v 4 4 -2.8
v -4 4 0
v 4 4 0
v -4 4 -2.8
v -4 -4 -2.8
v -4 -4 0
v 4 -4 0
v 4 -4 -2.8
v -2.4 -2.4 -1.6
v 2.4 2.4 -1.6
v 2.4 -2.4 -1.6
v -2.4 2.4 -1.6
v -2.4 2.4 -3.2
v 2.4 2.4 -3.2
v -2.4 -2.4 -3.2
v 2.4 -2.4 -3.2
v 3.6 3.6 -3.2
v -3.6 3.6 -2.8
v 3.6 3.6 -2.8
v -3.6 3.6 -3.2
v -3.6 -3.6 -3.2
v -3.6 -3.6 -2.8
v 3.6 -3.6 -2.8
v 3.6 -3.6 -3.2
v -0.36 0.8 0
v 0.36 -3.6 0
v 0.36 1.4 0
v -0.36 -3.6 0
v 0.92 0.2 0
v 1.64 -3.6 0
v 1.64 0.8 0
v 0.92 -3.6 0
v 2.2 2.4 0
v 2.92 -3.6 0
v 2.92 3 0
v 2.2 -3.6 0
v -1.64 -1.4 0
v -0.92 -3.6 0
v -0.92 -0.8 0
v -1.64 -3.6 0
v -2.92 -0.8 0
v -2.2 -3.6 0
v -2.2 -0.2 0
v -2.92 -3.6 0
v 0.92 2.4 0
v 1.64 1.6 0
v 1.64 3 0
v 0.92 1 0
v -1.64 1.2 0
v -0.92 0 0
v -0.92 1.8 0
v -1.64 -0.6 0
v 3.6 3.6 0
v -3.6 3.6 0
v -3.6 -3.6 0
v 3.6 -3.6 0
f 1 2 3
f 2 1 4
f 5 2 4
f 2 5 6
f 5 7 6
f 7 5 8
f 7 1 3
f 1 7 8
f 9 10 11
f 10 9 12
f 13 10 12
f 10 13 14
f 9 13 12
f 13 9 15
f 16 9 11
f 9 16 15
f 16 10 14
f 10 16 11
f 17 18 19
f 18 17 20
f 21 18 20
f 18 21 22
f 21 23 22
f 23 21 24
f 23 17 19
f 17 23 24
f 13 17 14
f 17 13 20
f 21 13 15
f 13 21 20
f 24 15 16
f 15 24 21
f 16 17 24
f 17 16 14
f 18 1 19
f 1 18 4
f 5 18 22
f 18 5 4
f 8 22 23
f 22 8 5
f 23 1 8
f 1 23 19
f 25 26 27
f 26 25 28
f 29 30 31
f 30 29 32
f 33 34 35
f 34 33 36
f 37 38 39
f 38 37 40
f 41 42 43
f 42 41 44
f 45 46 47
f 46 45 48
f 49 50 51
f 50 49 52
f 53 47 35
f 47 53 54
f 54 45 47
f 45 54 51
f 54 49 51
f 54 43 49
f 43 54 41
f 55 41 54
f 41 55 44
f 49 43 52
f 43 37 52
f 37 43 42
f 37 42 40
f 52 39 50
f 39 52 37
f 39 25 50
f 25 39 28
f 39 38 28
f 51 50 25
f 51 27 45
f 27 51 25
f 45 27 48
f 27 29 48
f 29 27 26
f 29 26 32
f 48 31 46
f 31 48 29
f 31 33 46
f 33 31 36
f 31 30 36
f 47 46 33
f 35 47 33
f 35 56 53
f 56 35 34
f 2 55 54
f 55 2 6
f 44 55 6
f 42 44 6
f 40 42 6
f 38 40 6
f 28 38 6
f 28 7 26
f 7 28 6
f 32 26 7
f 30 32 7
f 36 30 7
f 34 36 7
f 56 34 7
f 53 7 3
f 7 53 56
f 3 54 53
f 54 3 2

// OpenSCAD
// file: ../p/box5.scad
use <../lib.scad>
function ldraw_lib__box5() = [
// 0 Box with 5 Faces and All Edges
// 0 Name: box5.dat
// 0 Author: James Jessiman
// 0 !LDRAW_ORG Primitive UPDATE 2012-01
// 0 !LICENSE Licensed under CC BY 4.0 : see CAreadme.txt
// 
// 0 BFC CERTIFY CCW
  [0,"BFC","CERTIFY"],
  [0,"BFC","CCW"],
// 
// 0 !HISTORY 2002-04-03 [sbliss] Modified for BFC compliance
// 0 !HISTORY 2002-04-25 [PTadmin] Official Update 2002-02
// 0 !HISTORY 2007-06-24 [PTadmin] Header formatted for Contributor Agreement
// 0 !HISTORY 2008-07-01 [PTadmin] Official Update 2008-01
// 0 !HISTORY 2012-02-16 [Philo] Changed to CCW
// 0 !HISTORY 2012-03-30 [PTadmin] Official Update 2012-01
// 
// 
// 2 24 1 1 1 -1 1 1
  [2,24,1,1,1,-1,1,1],
// 2 24 -1 1 1 -1 1 -1
  [2,24,-1,1,1,-1,1,-1],
// 2 24 -1 1 -1 1 1 -1
  [2,24,-1,1,-1,1,1,-1],
// 2 24 1 1 -1 1 1 1
  [2,24,1,1,-1,1,1,1],
// 2 24 1 0 1 -1 0 1
  [2,24,1,0,1,-1,0,1],
// 2 24 -1 0 1 -1 0 -1
  [2,24,-1,0,1,-1,0,-1],
// 2 24 -1 0 -1 1 0 -1
  [2,24,-1,0,-1,1,0,-1],
// 2 24 1 0 -1 1 0 1
  [2,24,1,0,-1,1,0,1],
// 2 24 1 0 1 1 1 1
  [2,24,1,0,1,1,1,1],
// 2 24 -1 0 1 -1 1 1
  [2,24,-1,0,1,-1,1,1],
// 2 24 1 0 -1 1 1 -1
  [2,24,1,0,-1,1,1,-1],
// 2 24 -1 0 -1 -1 1 -1
  [2,24,-1,0,-1,-1,1,-1],
// 4 16 -1 1 1 1 1 1 1 1 -1 -1 1 -1
  [4,16,-1,1,1,1,1,1,1,1,-1,-1,1,-1],
// 4 16 -1 1 1 -1 0 1 1 0 1 1 1 1
  [4,16,-1,1,1,-1,0,1,1,0,1,1,1,1],
// 4 16 -1 1 -1 -1 0 -1 -1 0 1 -1 1 1
  [4,16,-1,1,-1,-1,0,-1,-1,0,1,-1,1,1],
// 4 16 1 1 -1 1 0 -1 -1 0 -1 -1 1 -1
  [4,16,1,1,-1,1,0,-1,-1,0,-1,-1,1,-1],
// 4 16 1 1 1 1 0 1 1 0 -1 1 1 -1
  [4,16,1,1,1,1,0,1,1,0,-1,1,1,-1],
];
module ldraw_lib__box5(step=0, col=false, unit=2/5, alt=false, line=0.2, solid=!$preview)
    makepoly(ldraw_lib__box5(), step=step, col=col, unit=unit, alt=alt, line=line, solid=solid);
ldraw_lib__box5(line=0.2);
// file: ../p/box4.scad
use <../lib.scad>
function ldraw_lib__box4() = [
// 0 Box with 4 Faces (2 Parallel Pairs) and All Edges
// 0 Name: box4.dat
// 0 Author: James Jessiman
// 0 !LDRAW_ORG Primitive UPDATE 2012-01
// 0 !LICENSE Licensed under CC BY 4.0 : see CAreadme.txt
// 
// 0 BFC CERTIFY CCW
  [0,"BFC","CERTIFY"],
  [0,"BFC","CCW"],
// 
// 0 !HISTORY 2002-04-03 [sbliss] Modified for BFC compliance
// 0 !HISTORY 2002-04-25 [PTadmin] Official Update 2002-02
// 0 !HISTORY 2007-06-24 [PTadmin] Header formatted for Contributor Agreement
// 0 !HISTORY 2008-07-01 [PTadmin] Official Update 2008-01
// 0 !HISTORY 2012-02-16 [Philo] Changed to CCW
// 0 !HISTORY 2012-03-30 [PTadmin] Official Update 2012-01
// 
// 
// 2 24 1 1 1 -1 1 1
  [2,24,1,1,1,-1,1,1],
// 2 24 -1 1 1 -1 1 -1
  [2,24,-1,1,1,-1,1,-1],
// 2 24 -1 1 -1 1 1 -1
  [2,24,-1,1,-1,1,1,-1],
// 2 24 1 1 -1 1 1 1
  [2,24,1,1,-1,1,1,1],
// 2 24 1 0 1 -1 0 1
  [2,24,1,0,1,-1,0,1],
// 2 24 -1 0 1 -1 0 -1
  [2,24,-1,0,1,-1,0,-1],
// 2 24 -1 0 -1 1 0 -1
  [2,24,-1,0,-1,1,0,-1],
// 2 24 1 0 -1 1 0 1
  [2,24,1,0,-1,1,0,1],
// 2 24 1 0 1 1 1 1
  [2,24,1,0,1,1,1,1],
// 2 24 -1 0 1 -1 1 1
  [2,24,-1,0,1,-1,1,1],
// 2 24 1 0 -1 1 1 -1
  [2,24,1,0,-1,1,1,-1],
// 2 24 -1 0 -1 -1 1 -1
  [2,24,-1,0,-1,-1,1,-1],
// 4 16 -1 1 1 -1 0 1 1 0 1 1 1 1
  [4,16,-1,1,1,-1,0,1,1,0,1,1,1,1],
// 4 16 -1 1 -1 -1 0 -1 -1 0 1 -1 1 1
  [4,16,-1,1,-1,-1,0,-1,-1,0,1,-1,1,1],
// 4 16 1 1 -1 1 0 -1 -1 0 -1 -1 1 -1
  [4,16,1,1,-1,1,0,-1,-1,0,-1,-1,1,-1],
// 4 16 1 1 1 1 0 1 1 0 -1 1 1 -1
  [4,16,1,1,1,1,0,1,1,0,-1,1,1,-1],
];
module ldraw_lib__box4(step=0, col=false, unit=2/5, alt=false, line=0.2, solid=!$preview)
    makepoly(ldraw_lib__box4(), step=step, col=col, unit=unit, alt=alt, line=line, solid=solid);
ldraw_lib__box4(line=0.2);
// file: s/3070bs01.scad
use <../../lib.scad>
use <../../p/box4.scad>
use <../../p/box5.scad>
function ldraw_lib__s__3070bs01() = [
// 0 ~Tile  1 x  1 with Groove without Top Face
// 0 Name: s\3070bs01.dat
// 0 Author: Chris Dee [cwdee]
// 0 !LDRAW_ORG Subpart UPDATE 2009-02
// 0 !LICENSE Licensed under CC BY 4.0 : see CAreadme.txt
// 
// 0 BFC CERTIFY CCW
  [0,"BFC","CERTIFY"],
  [0,"BFC","CCW"],
// 
// 0 !HISTORY 2009-09-03 [PTadmin] Official Update 2009-02
// 
// 
// 1 16 0 0 0 10 0 0 0 7 0 0 0 10 box4.dat
  [1,16,0,0,0,10,0,0,0,7,0,0,0,10, ldraw_lib__box4()],
// 0 BFC INVERTNEXT
  [0,"BFC","INVERTNEXT"],
// 1 16 0 8 0 6 0 0 0 -4 0 0 0 6 box5.dat
  [1,16,0,8,0,6,0,0,0,-4,0,0,0,6, ldraw_lib__box5()],
// 1 16 0 7 0 9 0 0 0 1 0 0 0 9 box4.dat
  [1,16,0,7,0,9,0,0,0,1,0,0,0,9, ldraw_lib__box4()],
// 
// 4 16 9 8 9 6 8 6 -6 8 6 -9 8 9
  [4,16,9,8,9,6,8,6,-6,8,6,-9,8,9],
// 4 16 -9 8 9 -6 8 6 -6 8 -6 -9 8 -9
  [4,16,-9,8,9,-6,8,6,-6,8,-6,-9,8,-9],
// 4 16 -9 8 -9 -6 8 -6 6 8 -6 9 8 -9
  [4,16,-9,8,-9,-6,8,-6,6,8,-6,9,8,-9],
// 4 16 9 8 -9 6 8 -6 6 8 6 9 8 9
  [4,16,9,8,-9,6,8,-6,6,8,6,9,8,9],
// 
// 4 16 10 7 10 9 7 9 -9 7 9 -10 7 10
  [4,16,10,7,10,9,7,9,-9,7,9,-10,7,10],
// 4 16 -10 7 10 -9 7 9 -9 7 -9 -10 7 -10
  [4,16,-10,7,10,-9,7,9,-9,7,-9,-10,7,-10],
// 4 16 -10 7 -10 -9 7 -9 9 7 -9 10 7 -10
  [4,16,-10,7,-10,-9,7,-9,9,7,-9,10,7,-10],
// 4 16 10 7 -10 9 7 -9 9 7 9 10 7 10
  [4,16,10,7,-10,9,7,-9,9,7,9,10,7,10],
// 0
];
module ldraw_lib__s__3070bs01(step=0, col=false, unit=2/5, alt=false, line=0.2, solid=!$preview)
    makepoly(ldraw_lib__s__3070bs01(), step=step, col=col, unit=unit, alt=alt, line=line, solid=solid);
ldraw_lib__s__3070bs01(line=0.2);
// main file
use <../lib.scad>
use <s/3070bs01.scad>
function ldraw_lib__3070bp13() = [
// 0 Tile  1 x  1 with Lines on Blue Background Pattern
// 0 Name: 3070bp13.dat
// 0 Author: Takeshi Takahashi [RainbowDolphin]
// 0 !LDRAW_ORG Part UPDATE 2022-01
// 0 !LICENSE Licensed under CC BY 4.0 : see CAreadme.txt
// 
// 0 BFC CERTIFY CCW
  [0,"BFC","CERTIFY"],
  [0,"BFC","CCW"],
// 
// 0 !KEYWORDS BrickLink 3070pb162, Dots, Go Team, Rebrickable 3070bpr0220
// 0 !KEYWORDS Set 41911
// 
// 0 !HISTORY 2022-01-14 [PTadmin] Official Update 2022-01
// 
// 
// 1 16 0 0 0 1 0 0 0 1 0 0 0 1 s\3070bs01.dat
  [1,16,0,0,0,1,0,0,0,1,0,0,0,1, ldraw_lib__s__3070bs01()],
// 4 16 -0.9 0 -9 0.9 0 -9 0.9 0 3.5 -0.9 0 2
  [4,16,-0.9,0,-9,0.9,0,-9,0.9,0,3.5,-0.9,0,2],
// 4 16 2.3 0 0.5 2.3 0 -9 4.1 0 -9 4.1 0 2
  [4,16,2.3,0,0.5,2.3,0,-9,4.1,0,-9,4.1,0,2],
// 4 16 5.5 0 6 5.5 0 -9 7.3 0 -9 7.3 0 7.5
  [4,16,5.5,0,6,5.5,0,-9,7.3,0,-9,7.3,0,7.5],
// 4 16 -4.1 0 -9 -2.3 0 -9 -2.3 0 -2 -4.1 0 -3.5
  [4,16,-4.1,0,-9,-2.3,0,-9,-2.3,0,-2,-4.1,0,-3.5],
// 4 16 -7.3 0 -9 -5.5 0 -9 -5.5 0 -0.5 -7.3 0 -2
  [4,16,-7.3,0,-9,-5.5,0,-9,-5.5,0,-0.5,-7.3,0,-2],
// 4 16 2.3 0 6 2.3 0 2.5 4.1 0 4 4.1 0 7.5
  [4,16,2.3,0,6,2.3,0,2.5,4.1,0,4,4.1,0,7.5],
// 4 16 -4.1 0 3 -4.1 0 -1.5 -2.3 0 0 -2.3 0 4.5
  [4,16,-4.1,0,3,-4.1,0,-1.5,-2.3,0,0,-2.3,0,4.5],
// 4 1 9 0 9 -9 0 9 4.1 0 7.5 7.3 0 7.5
  [4,1,9,0,9,-9,0,9,4.1,0,7.5,7.3,0,7.5],
// 4 1 2.3 0 6 4.1 0 7.5 -9 0 9 -2.3 0 4.5
  [4,1,2.3,0,6,4.1,0,7.5,-9,0,9,-2.3,0,4.5],
// 3 1 -9 0 9 -4.1 0 3 -2.3 0 4.5
  [3,1,-9,0,9,-4.1,0,3,-2.3,0,4.5],
// 4 1 -5.5 0 -0.5 -4.1 0 3 -9 0 9 -7.3 0 -2
  [4,1,-5.5,0,-0.5,-4.1,0,3,-9,0,9,-7.3,0,-2],
// 4 1 -7.3 0 -2 -9 0 9 -9 0 -9 -7.3 0 -9
  [4,1,-7.3,0,-2,-9,0,9,-9,0,-9,-7.3,0,-9],
// 3 1 -4.1 0 3 -5.5 0 -0.5 -4.1 0 -1.5
  [3,1,-4.1,0,3,-5.5,0,-0.5,-4.1,0,-1.5],
// 4 1 -4.1 0 -3.5 -4.1 0 -1.5 -5.5 0 -0.5 -5.5 0 -9
  [4,1,-4.1,0,-3.5,-4.1,0,-1.5,-5.5,0,-0.5,-5.5,0,-9],
// 3 1 -4.1 0 -3.5 -5.5 0 -9 -4.1 0 -9
  [3,1,-4.1,0,-3.5,-5.5,0,-9,-4.1,0,-9],
// 4 1 -2.3 0 0 -4.1 0 -1.5 -4.1 0 -3.5 -2.3 0 -2
  [4,1,-2.3,0,0,-4.1,0,-1.5,-4.1,0,-3.5,-2.3,0,-2],
// 4 1 -0.9 0 2 -2.3 0 0 -2.3 0 -2 -0.9 0 -9
  [4,1,-0.9,0,2,-2.3,0,0,-2.3,0,-2,-0.9,0,-9],
// 3 1 -2.3 0 -2 -2.3 0 -9 -0.9 0 -9
  [3,1,-2.3,0,-2,-2.3,0,-9,-0.9,0,-9],
// 3 1 -2.3 0 4.5 -2.3 0 0 -0.9 0 2
  [3,1,-2.3,0,4.5,-2.3,0,0,-0.9,0,2],
// 4 1 -2.3 0 4.5 -0.9 0 2 0.9 0 3.5 2.3 0 6
  [4,1,-2.3,0,4.5,-0.9,0,2,0.9,0,3.5,2.3,0,6],
// 3 1 2.3 0 6 0.9 0 3.5 2.3 0 2.5
  [3,1,2.3,0,6,0.9,0,3.5,2.3,0,2.5],
// 4 1 2.3 0 0.5 2.3 0 2.5 0.9 0 3.5 0.9 0 -9
  [4,1,2.3,0,0.5,2.3,0,2.5,0.9,0,3.5,0.9,0,-9],
// 3 1 2.3 0 0.5 0.9 0 -9 2.3 0 -9
  [3,1,2.3,0,0.5,0.9,0,-9,2.3,0,-9],
// 4 1 4.1 0 4 2.3 0 2.5 2.3 0 0.5 4.1 0 2
  [4,1,4.1,0,4,2.3,0,2.5,2.3,0,0.5,4.1,0,2],
// 4 1 5.5 0 6 4.1 0 4 4.1 0 2 5.5 0 -9
  [4,1,5.5,0,6,4.1,0,4,4.1,0,2,5.5,0,-9],
// 3 1 4.1 0 2 4.1 0 -9 5.5 0 -9
  [3,1,4.1,0,2,4.1,0,-9,5.5,0,-9],
// 3 1 4.1 0 7.5 4.1 0 4 5.5 0 6
  [3,1,4.1,0,7.5,4.1,0,4,5.5,0,6],
// 3 1 7.3 0 7.5 4.1 0 7.5 5.5 0 6
  [3,1,7.3,0,7.5,4.1,0,7.5,5.5,0,6],
// 4 1 9 0 -9 9 0 9 7.3 0 7.5 7.3 0 -9
  [4,1,9,0,-9,9,0,9,7.3,0,7.5,7.3,0,-9],
// 4 16 -9 0 9 -10 0 10 -10 0 -10 -9 0 -9
  [4,16,-9,0,9,-10,0,10,-10,0,-10,-9,0,-9],
// 3 16 -7.3 0 -9 -9 0 -9 -10 0 -10
  [3,16,-7.3,0,-9,-9,0,-9,-10,0,-10],
// 3 16 -5.5 0 -9 -7.3 0 -9 -10 0 -10
  [3,16,-5.5,0,-9,-7.3,0,-9,-10,0,-10],
// 3 16 -4.1 0 -9 -5.5 0 -9 -10 0 -10
  [3,16,-4.1,0,-9,-5.5,0,-9,-10,0,-10],
// 3 16 -2.3 0 -9 -4.1 0 -9 -10 0 -10
  [3,16,-2.3,0,-9,-4.1,0,-9,-10,0,-10],
// 3 16 -0.9 0 -9 -2.3 0 -9 -10 0 -10
  [3,16,-0.9,0,-9,-2.3,0,-9,-10,0,-10],
// 4 16 0.9 0 -9 -0.9 0 -9 -10 0 -10 10 0 -10
  [4,16,0.9,0,-9,-0.9,0,-9,-10,0,-10,10,0,-10],
// 3 16 2.3 0 -9 0.9 0 -9 10 0 -10
  [3,16,2.3,0,-9,0.9,0,-9,10,0,-10],
// 3 16 4.1 0 -9 2.3 0 -9 10 0 -10
  [3,16,4.1,0,-9,2.3,0,-9,10,0,-10],
// 3 16 5.5 0 -9 4.1 0 -9 10 0 -10
  [3,16,5.5,0,-9,4.1,0,-9,10,0,-10],
// 3 16 7.3 0 -9 5.5 0 -9 10 0 -10
  [3,16,7.3,0,-9,5.5,0,-9,10,0,-10],
// 3 16 9 0 -9 7.3 0 -9 10 0 -10
  [3,16,9,0,-9,7.3,0,-9,10,0,-10],
// 4 16 9 0 -9 10 0 -10 10 0 10 9 0 9
  [4,16,9,0,-9,10,0,-10,10,0,10,9,0,9],
// 4 16 9 0 9 10 0 10 -10 0 10 -9 0 9
  [4,16,9,0,9,10,0,10,-10,0,10,-9,0,9],
];
module ldraw_lib__3070bp13(step=0, col=false, unit=2/5, alt=false, line=0.2, solid=!$preview)
    makepoly(ldraw_lib__3070bp13(), step=step, col=col, unit=unit, alt=alt, line=line, solid=solid);
ldraw_lib__3070bp13(line=0.2);
